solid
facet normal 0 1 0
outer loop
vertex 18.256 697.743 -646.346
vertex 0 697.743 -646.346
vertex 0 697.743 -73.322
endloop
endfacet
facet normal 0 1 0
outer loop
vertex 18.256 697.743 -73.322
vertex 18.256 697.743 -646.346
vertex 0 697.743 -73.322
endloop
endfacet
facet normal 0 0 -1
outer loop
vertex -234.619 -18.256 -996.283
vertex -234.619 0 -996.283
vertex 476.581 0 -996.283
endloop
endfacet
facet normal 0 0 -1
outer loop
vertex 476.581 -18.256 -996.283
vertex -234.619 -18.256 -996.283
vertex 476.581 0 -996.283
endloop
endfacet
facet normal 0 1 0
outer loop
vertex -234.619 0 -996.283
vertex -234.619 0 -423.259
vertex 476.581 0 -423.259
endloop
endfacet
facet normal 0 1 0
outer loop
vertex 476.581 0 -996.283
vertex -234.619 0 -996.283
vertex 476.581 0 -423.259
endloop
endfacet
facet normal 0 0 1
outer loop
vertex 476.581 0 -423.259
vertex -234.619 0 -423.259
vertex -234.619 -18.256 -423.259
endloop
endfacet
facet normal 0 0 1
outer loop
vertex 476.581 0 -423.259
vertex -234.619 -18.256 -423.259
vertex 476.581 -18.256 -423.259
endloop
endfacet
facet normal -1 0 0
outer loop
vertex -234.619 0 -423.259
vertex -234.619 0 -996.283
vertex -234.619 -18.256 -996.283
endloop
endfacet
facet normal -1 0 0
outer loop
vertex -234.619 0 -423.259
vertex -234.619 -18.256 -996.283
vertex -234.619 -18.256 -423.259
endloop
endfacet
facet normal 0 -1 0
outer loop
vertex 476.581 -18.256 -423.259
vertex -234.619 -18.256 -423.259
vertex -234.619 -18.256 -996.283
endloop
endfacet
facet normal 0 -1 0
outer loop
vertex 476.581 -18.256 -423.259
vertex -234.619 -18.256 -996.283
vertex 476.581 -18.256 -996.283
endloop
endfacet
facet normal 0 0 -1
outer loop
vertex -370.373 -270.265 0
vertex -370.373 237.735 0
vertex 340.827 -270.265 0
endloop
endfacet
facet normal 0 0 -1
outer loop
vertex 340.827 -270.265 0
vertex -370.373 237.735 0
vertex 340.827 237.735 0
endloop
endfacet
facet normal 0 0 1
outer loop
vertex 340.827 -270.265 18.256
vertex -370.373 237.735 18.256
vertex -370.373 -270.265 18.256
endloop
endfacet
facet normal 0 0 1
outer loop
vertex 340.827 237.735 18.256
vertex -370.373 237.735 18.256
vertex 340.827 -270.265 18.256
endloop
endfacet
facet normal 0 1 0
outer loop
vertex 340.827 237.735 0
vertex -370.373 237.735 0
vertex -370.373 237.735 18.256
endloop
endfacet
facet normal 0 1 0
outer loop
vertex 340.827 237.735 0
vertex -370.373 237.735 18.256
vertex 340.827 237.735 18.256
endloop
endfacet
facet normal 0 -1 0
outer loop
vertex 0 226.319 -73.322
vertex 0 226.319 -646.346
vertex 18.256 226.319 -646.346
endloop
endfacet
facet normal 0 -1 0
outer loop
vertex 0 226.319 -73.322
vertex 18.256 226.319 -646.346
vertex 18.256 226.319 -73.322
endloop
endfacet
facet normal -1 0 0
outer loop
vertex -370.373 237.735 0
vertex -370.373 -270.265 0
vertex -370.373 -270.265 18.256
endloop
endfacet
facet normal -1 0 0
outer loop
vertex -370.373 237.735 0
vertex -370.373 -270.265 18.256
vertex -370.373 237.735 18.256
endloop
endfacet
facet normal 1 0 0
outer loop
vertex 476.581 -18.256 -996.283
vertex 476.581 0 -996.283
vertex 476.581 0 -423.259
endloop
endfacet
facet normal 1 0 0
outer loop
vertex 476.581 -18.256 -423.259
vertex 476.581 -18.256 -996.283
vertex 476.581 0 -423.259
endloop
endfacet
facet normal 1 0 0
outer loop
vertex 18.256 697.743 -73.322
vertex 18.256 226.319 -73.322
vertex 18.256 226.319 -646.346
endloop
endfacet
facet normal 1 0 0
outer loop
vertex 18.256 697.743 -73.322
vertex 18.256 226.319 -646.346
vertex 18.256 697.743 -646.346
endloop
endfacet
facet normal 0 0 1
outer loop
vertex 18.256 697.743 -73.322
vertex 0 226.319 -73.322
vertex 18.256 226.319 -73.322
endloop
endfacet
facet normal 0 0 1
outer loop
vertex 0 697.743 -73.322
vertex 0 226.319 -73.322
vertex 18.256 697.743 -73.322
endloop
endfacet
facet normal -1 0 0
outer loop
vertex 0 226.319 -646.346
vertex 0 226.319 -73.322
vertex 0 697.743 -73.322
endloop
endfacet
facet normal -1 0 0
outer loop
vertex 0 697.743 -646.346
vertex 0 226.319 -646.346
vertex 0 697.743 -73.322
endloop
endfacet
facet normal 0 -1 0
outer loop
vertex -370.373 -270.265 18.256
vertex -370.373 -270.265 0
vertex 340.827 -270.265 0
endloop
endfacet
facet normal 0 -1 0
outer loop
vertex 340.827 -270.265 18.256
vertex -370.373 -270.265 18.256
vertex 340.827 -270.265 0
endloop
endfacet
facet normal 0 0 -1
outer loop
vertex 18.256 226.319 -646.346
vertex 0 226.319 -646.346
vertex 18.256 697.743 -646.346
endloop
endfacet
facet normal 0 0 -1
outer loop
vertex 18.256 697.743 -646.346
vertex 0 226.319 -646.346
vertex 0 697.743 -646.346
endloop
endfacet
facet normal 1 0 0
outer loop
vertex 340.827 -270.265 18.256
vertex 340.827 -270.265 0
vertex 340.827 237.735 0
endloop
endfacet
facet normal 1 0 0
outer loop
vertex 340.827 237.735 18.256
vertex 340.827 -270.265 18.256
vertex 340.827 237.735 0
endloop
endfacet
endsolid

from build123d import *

# Parameters (mm, degrees)
F0_W     = 711.2
F0_H     = 508
F1_DEPTH = 18.25625
F2_W     = 711.2
F2_H     = 573.024
F3_DEPTH = 18.25625
F4_W     = 471.424
F4_H     = 573.024
F5_DEPTH = 18.25625


with BuildPart() as f1:
    # F0 (on Top) → F1 (new body)
    with BuildSketch(Plane.XY):
        with Locations((-14.772897, -16.26513)):
            Rectangle(F0_W, F0_H)
    extrude(amount=F1_DEPTH)


with BuildPart() as f3:
    # F2 (on Front) → F3 (new body)
    with BuildSketch(Plane.XZ):
        with Locations((120.981328, -709.771233)):
            Rectangle(F2_W, F2_H)
    extrude(amount=F3_DEPTH)


with BuildPart() as f5:
    # F4 (on Right) → F5 (new body)
    with BuildSketch(Plane.YZ):
        with Locations((462.030777, -359.833615)):
            Rectangle(F4_W, F4_H)
    extrude(amount=F5_DEPTH)


solid = Compound([f1.part, f3.part, f5.part])
